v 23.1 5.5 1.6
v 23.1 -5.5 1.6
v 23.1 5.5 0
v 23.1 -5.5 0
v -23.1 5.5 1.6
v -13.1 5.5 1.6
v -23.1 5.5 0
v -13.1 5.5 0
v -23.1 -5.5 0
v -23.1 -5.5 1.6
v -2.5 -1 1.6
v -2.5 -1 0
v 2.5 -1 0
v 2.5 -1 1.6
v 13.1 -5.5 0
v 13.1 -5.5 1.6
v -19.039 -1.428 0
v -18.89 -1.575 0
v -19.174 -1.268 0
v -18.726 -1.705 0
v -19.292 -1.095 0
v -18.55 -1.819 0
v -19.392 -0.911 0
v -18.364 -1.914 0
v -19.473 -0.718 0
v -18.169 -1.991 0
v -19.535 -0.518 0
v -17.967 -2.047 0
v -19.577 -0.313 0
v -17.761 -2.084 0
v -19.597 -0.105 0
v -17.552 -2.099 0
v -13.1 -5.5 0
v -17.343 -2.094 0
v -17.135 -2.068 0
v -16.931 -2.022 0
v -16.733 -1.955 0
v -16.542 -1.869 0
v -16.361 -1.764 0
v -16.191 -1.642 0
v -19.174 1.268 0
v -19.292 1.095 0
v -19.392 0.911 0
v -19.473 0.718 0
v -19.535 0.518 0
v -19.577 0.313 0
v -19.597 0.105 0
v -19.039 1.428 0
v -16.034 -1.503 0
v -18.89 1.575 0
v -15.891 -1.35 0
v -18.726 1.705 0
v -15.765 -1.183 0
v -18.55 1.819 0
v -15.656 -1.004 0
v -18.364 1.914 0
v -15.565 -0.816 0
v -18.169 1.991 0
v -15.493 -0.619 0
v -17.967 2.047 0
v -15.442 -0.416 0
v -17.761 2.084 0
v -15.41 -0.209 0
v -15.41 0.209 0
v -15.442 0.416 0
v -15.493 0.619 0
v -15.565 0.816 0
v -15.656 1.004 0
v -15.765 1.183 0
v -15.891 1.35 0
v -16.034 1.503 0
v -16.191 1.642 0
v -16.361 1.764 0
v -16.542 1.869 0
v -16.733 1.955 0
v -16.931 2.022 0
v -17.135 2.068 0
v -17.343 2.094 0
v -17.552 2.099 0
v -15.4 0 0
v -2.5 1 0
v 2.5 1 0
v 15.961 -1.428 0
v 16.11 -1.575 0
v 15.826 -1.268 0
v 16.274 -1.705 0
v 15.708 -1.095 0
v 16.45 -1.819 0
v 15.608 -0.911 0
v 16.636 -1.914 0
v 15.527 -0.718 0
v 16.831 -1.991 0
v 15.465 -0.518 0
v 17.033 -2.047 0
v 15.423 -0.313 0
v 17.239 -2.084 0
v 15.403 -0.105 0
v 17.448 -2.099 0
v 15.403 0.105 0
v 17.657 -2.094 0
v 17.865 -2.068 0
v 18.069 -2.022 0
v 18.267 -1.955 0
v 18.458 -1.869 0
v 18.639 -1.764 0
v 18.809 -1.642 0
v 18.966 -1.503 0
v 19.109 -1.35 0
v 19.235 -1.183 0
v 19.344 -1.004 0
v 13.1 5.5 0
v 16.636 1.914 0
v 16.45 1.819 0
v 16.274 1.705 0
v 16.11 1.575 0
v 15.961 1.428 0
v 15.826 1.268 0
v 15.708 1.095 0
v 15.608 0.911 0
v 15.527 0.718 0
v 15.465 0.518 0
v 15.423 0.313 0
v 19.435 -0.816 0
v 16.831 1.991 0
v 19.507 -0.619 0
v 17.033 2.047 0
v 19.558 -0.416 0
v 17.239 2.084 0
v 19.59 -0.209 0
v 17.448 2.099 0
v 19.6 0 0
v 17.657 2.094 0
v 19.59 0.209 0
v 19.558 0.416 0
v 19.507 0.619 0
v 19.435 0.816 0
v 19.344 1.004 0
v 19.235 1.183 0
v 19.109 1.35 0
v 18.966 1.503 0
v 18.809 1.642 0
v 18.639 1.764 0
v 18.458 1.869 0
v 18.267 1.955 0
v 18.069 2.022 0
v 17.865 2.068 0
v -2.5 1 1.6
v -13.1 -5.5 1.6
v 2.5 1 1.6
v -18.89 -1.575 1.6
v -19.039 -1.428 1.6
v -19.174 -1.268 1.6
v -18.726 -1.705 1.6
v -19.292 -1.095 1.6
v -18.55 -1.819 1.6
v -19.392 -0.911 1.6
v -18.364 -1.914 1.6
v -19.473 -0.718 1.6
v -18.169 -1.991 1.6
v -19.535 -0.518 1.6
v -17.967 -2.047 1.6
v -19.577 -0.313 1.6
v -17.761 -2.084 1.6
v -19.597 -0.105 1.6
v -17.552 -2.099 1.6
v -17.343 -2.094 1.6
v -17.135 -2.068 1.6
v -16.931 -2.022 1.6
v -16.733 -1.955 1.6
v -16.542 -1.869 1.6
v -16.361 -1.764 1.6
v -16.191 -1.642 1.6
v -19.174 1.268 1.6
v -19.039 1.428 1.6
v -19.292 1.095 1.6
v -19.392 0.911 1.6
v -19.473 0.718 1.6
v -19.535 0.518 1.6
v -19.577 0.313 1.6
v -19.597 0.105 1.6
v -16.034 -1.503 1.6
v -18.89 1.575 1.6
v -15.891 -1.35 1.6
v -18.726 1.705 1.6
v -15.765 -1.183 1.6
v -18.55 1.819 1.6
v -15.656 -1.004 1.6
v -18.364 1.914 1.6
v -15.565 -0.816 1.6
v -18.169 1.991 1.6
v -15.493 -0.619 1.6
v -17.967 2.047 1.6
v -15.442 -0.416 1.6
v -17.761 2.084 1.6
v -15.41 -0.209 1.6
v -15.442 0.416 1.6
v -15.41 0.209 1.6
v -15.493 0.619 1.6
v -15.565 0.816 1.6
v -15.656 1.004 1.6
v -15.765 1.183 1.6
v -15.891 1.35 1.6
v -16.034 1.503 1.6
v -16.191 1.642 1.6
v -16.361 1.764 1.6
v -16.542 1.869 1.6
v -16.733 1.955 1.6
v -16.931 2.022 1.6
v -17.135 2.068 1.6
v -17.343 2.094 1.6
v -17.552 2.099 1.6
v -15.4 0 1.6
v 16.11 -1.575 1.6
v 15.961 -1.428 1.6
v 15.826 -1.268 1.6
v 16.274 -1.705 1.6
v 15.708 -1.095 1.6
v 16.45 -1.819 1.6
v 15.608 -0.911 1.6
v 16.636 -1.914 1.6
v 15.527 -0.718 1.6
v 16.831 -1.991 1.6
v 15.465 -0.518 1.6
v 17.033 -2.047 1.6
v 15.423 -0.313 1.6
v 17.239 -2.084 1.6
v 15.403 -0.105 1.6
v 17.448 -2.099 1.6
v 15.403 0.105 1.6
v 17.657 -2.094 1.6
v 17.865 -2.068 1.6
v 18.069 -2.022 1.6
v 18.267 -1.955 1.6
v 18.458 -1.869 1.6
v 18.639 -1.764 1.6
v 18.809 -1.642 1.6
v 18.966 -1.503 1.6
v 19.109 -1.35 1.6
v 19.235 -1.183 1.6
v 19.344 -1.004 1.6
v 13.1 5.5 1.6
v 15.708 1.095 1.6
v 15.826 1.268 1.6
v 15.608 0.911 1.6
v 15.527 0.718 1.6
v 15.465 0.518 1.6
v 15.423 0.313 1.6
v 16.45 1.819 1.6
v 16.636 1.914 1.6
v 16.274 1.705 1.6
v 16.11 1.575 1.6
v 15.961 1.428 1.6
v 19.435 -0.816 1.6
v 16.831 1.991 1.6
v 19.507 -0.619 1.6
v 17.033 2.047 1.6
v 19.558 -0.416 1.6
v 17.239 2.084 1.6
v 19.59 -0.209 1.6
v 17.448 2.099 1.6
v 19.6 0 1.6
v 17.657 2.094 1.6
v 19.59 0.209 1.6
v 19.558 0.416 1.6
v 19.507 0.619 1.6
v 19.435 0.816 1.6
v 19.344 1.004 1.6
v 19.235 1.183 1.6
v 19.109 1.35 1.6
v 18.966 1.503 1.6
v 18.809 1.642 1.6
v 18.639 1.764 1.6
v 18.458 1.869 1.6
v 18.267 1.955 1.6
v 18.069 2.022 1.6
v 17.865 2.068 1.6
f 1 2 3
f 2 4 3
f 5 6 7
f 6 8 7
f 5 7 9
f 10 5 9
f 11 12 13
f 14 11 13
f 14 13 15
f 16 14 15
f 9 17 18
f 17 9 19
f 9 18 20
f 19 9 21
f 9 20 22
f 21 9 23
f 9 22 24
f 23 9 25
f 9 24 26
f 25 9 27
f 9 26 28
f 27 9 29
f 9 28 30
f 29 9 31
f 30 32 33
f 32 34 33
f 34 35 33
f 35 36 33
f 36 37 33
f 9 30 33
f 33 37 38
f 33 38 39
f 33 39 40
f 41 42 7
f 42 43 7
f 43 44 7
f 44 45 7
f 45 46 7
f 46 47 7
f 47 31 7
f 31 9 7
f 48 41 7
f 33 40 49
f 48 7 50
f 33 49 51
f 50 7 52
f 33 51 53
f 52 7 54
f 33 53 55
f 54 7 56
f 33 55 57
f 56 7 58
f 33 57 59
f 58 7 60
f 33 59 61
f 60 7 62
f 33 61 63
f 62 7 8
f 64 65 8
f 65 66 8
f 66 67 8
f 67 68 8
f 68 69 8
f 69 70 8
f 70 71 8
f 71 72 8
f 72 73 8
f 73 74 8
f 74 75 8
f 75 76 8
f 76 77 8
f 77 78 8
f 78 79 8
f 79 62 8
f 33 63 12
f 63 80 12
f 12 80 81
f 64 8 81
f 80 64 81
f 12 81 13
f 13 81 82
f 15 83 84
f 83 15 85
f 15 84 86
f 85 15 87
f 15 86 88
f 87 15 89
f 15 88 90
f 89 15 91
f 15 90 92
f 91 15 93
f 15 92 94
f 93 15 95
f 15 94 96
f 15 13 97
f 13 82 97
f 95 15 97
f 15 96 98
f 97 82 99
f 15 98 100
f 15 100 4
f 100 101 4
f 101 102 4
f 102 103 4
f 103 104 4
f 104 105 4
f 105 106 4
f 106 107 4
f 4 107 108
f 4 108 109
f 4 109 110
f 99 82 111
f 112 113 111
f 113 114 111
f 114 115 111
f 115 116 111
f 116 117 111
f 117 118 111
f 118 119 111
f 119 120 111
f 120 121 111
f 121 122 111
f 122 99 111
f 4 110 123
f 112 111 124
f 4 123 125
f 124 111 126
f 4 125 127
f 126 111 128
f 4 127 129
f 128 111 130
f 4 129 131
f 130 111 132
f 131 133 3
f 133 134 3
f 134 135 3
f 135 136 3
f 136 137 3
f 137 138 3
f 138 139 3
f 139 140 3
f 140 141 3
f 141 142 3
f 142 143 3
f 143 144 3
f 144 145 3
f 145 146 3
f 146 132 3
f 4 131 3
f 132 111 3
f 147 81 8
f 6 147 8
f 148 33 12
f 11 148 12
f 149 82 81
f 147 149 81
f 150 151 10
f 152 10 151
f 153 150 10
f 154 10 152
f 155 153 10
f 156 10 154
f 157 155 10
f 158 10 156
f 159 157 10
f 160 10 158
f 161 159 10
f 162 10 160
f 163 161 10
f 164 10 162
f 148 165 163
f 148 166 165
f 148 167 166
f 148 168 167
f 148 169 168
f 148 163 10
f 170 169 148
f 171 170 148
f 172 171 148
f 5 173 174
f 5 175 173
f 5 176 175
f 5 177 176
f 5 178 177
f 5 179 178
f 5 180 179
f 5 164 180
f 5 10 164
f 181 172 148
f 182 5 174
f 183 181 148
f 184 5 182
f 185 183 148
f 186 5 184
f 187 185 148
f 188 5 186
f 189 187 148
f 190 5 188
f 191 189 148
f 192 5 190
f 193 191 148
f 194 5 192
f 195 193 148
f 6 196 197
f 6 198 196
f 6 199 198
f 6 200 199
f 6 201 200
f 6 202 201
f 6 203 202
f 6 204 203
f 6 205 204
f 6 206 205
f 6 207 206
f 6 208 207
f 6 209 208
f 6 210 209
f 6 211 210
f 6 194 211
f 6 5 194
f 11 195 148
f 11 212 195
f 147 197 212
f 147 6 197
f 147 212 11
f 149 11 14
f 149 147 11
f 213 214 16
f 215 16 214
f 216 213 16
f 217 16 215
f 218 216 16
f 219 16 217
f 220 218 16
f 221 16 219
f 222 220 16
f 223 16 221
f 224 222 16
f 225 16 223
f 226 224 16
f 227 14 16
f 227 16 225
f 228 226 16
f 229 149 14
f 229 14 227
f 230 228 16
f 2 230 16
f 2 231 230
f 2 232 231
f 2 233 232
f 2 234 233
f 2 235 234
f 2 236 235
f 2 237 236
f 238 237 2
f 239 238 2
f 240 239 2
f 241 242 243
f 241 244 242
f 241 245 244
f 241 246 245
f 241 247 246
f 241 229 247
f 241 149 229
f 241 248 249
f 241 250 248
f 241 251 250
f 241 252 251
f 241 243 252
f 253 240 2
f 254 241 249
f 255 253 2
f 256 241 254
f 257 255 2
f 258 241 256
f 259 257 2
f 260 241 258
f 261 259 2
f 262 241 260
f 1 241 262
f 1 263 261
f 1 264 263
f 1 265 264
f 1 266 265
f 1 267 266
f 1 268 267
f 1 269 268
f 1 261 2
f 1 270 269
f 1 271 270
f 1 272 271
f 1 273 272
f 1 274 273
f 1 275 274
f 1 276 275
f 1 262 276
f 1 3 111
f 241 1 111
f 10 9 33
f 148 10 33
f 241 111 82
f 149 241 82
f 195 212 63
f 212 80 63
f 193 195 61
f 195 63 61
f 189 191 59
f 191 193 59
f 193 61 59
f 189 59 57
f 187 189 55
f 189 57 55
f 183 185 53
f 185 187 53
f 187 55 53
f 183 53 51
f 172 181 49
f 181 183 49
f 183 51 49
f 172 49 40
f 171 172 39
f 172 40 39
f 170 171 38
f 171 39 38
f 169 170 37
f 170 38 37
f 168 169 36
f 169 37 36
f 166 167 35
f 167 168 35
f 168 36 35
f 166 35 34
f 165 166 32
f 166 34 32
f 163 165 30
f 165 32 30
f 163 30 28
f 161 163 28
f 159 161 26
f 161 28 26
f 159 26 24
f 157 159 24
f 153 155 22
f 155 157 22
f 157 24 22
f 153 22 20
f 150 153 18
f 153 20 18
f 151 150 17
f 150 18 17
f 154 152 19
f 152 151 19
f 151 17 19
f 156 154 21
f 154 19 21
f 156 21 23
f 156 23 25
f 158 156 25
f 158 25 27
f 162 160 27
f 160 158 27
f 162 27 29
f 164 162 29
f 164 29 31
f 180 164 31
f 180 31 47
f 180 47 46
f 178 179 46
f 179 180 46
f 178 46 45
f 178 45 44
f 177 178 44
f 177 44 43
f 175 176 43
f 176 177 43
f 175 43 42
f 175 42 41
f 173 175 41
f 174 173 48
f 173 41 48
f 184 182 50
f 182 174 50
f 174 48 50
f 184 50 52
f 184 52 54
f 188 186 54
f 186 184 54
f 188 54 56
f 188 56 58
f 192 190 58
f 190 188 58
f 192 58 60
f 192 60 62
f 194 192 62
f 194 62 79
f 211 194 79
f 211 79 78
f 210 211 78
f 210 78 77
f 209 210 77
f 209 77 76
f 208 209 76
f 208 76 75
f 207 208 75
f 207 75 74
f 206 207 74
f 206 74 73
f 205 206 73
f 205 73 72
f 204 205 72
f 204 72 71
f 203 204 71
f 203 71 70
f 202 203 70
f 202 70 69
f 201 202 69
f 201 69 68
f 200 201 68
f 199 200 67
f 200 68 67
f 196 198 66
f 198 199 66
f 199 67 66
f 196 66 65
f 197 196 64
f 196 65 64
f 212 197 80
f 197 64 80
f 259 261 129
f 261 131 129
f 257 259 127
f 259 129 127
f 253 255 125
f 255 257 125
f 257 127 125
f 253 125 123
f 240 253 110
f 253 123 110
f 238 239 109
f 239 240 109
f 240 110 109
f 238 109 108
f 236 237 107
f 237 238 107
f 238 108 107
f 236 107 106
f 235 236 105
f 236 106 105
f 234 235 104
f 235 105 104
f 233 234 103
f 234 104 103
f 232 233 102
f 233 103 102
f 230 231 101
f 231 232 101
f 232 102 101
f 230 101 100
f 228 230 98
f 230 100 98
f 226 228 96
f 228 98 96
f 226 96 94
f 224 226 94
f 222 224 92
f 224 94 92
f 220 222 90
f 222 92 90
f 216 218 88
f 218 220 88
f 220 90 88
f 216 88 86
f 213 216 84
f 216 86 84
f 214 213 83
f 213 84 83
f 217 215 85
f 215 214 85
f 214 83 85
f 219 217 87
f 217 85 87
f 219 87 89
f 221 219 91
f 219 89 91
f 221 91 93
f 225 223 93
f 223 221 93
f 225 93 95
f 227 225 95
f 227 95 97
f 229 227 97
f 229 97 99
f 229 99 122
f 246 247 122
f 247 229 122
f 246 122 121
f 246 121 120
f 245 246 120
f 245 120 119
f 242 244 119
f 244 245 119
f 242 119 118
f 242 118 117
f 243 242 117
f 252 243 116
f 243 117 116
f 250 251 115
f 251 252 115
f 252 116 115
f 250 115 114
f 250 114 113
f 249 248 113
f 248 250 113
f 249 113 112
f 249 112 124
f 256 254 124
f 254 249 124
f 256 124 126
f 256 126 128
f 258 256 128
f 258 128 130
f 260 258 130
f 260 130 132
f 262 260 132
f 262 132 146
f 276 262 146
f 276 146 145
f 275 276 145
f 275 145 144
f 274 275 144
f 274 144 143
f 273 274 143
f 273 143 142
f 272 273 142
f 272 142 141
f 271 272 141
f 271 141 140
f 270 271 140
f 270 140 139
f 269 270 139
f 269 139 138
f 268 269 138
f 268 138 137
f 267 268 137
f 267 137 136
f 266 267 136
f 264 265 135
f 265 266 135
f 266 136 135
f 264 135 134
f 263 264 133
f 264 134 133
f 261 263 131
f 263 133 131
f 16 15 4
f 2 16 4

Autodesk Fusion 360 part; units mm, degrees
sketch "Boceto1" plane through (0, 0, 0) normal (0, 0, 1) x (1, 0, 0)
  line L0 (-23.1, 5.5) -> (-23.1, -5.5)
  line L1 (-23.1, -5.5) -> (-13.1, -5.5)
  line L2 (-13.1, -5.5) -> (-2.5, -1)
  line L3 (-2.5, -1) -> (2.5, -1)
  line L4 (2.5, -1) -> (13.1, -5.5)
  line L5 (13.1, -5.5) -> (23.1, -5.5)
  line L6 (23.1, -5.5) -> (23.1, 5.5)
  line L7 (23.1, 5.5) -> (13.1, 5.5)
  line L8 (13.1, 5.5) -> (2.5, 1)
  line L9 (2.5, 1) -> (-2.5, 1)
  line L10 (-2.5, 1) -> (-13.1, 5.5)
  line L11 (-13.1, 5.5) -> (-23.1, 5.5)
  line L12 (0, -1) -> (0, 1) construction
  line L13 (-23.1, 0) -> (23.1, 0) construction
  circle A0 centre (-17.5, 0) radius 2.1
  circle A1 centre (17.5, 0) radius 2.1
  point P0 (-19.6, 0)
  point P1 (-17.5, -2.1)
  dimension "d1" = 11
  dimension "d2" = 4.2
  dimension "d3" = 5
  dimension "d4" = 3.5
  dimension "d5" = 35
  dimension "d6" = 2
  dimension "d7" = 10
  dimension "d8" = 3.4
extrude "Extruir1" add sketch "Boceto1" along normal blind 1.6
